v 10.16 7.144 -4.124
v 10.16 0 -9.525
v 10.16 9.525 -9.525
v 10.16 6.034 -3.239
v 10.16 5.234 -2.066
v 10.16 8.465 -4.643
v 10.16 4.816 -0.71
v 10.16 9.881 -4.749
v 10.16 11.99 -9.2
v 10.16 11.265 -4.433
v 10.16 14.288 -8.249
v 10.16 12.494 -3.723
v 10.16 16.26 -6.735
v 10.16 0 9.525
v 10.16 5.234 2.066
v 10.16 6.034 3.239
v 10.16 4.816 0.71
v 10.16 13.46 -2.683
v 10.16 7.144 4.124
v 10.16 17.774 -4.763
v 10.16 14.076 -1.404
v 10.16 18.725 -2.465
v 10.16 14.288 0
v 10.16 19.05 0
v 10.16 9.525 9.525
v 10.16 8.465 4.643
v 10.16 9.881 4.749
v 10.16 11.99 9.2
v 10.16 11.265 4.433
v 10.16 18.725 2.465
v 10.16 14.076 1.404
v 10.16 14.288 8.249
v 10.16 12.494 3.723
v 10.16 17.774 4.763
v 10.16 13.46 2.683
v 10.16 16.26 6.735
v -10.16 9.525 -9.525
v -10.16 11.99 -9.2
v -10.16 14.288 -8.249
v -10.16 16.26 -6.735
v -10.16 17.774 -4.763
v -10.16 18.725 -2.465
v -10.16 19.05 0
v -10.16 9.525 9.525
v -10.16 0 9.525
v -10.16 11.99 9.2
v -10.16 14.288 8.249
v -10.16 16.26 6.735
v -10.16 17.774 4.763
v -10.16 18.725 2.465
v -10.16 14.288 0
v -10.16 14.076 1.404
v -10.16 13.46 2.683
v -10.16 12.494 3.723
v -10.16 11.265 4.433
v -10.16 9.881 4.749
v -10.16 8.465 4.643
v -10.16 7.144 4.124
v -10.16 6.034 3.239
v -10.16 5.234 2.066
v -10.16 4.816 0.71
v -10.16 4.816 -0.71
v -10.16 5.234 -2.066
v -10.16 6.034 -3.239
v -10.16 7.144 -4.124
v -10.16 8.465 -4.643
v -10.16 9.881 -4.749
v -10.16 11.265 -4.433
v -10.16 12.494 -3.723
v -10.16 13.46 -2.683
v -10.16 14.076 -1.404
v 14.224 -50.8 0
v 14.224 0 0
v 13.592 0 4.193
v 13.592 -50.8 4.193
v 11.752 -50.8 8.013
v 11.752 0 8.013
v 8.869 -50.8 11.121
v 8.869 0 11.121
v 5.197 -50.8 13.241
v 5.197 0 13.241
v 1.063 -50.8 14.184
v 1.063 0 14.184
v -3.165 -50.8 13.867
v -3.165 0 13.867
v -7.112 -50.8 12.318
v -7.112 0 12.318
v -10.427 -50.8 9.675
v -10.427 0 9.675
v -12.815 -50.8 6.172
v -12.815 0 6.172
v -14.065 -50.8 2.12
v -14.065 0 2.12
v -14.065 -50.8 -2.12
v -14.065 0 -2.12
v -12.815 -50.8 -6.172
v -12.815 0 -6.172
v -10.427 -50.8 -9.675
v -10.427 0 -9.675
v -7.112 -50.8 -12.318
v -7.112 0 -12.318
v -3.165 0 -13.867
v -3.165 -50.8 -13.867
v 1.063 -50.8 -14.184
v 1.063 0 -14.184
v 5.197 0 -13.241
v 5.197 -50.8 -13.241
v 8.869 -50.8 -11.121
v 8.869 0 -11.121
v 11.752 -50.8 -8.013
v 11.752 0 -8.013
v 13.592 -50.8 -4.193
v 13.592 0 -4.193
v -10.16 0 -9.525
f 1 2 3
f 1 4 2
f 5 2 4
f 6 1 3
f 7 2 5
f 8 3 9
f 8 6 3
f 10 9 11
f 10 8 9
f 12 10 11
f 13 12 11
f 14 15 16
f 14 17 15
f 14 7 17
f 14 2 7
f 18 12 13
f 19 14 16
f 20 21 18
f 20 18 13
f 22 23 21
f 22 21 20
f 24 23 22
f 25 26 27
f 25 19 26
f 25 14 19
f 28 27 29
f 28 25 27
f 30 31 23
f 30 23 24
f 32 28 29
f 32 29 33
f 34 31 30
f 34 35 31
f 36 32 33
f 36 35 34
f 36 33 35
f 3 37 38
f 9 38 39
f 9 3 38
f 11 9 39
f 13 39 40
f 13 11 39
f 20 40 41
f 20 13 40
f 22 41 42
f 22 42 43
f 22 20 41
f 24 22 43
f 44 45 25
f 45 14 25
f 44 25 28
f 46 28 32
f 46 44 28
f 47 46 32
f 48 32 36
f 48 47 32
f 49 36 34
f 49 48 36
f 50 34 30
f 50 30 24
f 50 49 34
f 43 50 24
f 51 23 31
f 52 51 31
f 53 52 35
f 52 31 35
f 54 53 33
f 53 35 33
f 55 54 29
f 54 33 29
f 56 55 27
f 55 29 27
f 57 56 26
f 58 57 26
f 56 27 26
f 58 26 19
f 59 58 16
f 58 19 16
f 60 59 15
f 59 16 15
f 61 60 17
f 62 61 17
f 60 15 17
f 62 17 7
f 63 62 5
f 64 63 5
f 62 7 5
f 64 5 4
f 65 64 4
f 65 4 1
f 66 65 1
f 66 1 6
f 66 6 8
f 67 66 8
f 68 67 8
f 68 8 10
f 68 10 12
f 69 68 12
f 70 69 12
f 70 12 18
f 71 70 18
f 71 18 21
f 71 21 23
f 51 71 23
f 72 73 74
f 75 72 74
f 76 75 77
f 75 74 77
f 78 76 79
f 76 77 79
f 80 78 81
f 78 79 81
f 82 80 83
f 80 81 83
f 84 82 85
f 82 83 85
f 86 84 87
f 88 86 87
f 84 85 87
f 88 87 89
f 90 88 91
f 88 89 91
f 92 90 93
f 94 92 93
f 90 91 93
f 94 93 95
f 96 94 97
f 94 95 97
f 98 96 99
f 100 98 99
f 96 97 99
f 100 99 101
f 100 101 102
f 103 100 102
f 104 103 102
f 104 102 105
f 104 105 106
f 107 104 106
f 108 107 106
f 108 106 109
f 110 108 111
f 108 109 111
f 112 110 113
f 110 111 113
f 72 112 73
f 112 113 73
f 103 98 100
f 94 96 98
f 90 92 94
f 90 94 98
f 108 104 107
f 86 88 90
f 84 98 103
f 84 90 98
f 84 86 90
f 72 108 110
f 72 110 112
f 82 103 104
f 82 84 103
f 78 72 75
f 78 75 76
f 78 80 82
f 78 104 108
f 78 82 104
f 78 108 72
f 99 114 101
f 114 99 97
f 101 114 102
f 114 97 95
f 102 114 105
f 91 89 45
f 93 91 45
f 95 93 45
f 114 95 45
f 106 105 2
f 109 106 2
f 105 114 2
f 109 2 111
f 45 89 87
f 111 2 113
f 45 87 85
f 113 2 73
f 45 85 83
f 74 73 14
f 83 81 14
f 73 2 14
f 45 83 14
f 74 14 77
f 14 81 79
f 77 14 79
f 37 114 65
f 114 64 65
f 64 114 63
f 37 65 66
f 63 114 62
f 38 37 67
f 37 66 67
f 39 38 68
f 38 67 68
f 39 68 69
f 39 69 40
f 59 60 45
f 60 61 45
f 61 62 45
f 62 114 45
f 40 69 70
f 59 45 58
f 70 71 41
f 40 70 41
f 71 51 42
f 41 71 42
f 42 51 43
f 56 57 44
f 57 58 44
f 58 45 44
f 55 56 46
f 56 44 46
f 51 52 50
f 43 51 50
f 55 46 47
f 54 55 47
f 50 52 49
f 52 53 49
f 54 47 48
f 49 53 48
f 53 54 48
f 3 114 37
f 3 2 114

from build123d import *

# Parameters (mm, degrees)
F0_R     = 14.224
F1_DEPTH = 50.8
F2_W     = 19.05
F2_H     = 19.05
F3_DEPTH = 10.16
F4_R     = 4.7625
F5_DEPTH = 25.4
F6_R     = 9.52499


# Not quite as in the source:
# - a fillet or chamfer is up to 0.001 mm smaller than in the source, because OpenCascade refuses the exact size


with BuildPart() as f1:
    # F0 (on Front) → F1 (new body)
    with BuildSketch(Plane.XZ):
        Circle(F0_R)
    extrude(amount=F1_DEPTH)

    # F2 (on Right) → F3 (join, symmetric)
    with BuildSketch(Plane.YZ):
        with Locations((9.525, 0)):
            Rectangle(F2_W, F2_H)
    extrude(amount=F3_DEPTH, both=True)

    # F4 (on face) → F5 (cut)
    with BuildSketch(Plane.YZ.offset(10.16)):
        with Locations((9.525, 0)):
            Circle(F4_R)
    extrude(amount=-F5_DEPTH, mode=Mode.SUBTRACT)

    # F6 (radius 9.525 in the source; OpenCascade refuses exactly that, so slightly less here)
    f6_edges = [f1.edges().sort_by_distance(p)[0] for p in [
        (0, 19.05, 9.525),
        (0, 19.05, -9.525),
    ]]
    fillet(f6_edges, radius=F6_R)


solid = f1.part
